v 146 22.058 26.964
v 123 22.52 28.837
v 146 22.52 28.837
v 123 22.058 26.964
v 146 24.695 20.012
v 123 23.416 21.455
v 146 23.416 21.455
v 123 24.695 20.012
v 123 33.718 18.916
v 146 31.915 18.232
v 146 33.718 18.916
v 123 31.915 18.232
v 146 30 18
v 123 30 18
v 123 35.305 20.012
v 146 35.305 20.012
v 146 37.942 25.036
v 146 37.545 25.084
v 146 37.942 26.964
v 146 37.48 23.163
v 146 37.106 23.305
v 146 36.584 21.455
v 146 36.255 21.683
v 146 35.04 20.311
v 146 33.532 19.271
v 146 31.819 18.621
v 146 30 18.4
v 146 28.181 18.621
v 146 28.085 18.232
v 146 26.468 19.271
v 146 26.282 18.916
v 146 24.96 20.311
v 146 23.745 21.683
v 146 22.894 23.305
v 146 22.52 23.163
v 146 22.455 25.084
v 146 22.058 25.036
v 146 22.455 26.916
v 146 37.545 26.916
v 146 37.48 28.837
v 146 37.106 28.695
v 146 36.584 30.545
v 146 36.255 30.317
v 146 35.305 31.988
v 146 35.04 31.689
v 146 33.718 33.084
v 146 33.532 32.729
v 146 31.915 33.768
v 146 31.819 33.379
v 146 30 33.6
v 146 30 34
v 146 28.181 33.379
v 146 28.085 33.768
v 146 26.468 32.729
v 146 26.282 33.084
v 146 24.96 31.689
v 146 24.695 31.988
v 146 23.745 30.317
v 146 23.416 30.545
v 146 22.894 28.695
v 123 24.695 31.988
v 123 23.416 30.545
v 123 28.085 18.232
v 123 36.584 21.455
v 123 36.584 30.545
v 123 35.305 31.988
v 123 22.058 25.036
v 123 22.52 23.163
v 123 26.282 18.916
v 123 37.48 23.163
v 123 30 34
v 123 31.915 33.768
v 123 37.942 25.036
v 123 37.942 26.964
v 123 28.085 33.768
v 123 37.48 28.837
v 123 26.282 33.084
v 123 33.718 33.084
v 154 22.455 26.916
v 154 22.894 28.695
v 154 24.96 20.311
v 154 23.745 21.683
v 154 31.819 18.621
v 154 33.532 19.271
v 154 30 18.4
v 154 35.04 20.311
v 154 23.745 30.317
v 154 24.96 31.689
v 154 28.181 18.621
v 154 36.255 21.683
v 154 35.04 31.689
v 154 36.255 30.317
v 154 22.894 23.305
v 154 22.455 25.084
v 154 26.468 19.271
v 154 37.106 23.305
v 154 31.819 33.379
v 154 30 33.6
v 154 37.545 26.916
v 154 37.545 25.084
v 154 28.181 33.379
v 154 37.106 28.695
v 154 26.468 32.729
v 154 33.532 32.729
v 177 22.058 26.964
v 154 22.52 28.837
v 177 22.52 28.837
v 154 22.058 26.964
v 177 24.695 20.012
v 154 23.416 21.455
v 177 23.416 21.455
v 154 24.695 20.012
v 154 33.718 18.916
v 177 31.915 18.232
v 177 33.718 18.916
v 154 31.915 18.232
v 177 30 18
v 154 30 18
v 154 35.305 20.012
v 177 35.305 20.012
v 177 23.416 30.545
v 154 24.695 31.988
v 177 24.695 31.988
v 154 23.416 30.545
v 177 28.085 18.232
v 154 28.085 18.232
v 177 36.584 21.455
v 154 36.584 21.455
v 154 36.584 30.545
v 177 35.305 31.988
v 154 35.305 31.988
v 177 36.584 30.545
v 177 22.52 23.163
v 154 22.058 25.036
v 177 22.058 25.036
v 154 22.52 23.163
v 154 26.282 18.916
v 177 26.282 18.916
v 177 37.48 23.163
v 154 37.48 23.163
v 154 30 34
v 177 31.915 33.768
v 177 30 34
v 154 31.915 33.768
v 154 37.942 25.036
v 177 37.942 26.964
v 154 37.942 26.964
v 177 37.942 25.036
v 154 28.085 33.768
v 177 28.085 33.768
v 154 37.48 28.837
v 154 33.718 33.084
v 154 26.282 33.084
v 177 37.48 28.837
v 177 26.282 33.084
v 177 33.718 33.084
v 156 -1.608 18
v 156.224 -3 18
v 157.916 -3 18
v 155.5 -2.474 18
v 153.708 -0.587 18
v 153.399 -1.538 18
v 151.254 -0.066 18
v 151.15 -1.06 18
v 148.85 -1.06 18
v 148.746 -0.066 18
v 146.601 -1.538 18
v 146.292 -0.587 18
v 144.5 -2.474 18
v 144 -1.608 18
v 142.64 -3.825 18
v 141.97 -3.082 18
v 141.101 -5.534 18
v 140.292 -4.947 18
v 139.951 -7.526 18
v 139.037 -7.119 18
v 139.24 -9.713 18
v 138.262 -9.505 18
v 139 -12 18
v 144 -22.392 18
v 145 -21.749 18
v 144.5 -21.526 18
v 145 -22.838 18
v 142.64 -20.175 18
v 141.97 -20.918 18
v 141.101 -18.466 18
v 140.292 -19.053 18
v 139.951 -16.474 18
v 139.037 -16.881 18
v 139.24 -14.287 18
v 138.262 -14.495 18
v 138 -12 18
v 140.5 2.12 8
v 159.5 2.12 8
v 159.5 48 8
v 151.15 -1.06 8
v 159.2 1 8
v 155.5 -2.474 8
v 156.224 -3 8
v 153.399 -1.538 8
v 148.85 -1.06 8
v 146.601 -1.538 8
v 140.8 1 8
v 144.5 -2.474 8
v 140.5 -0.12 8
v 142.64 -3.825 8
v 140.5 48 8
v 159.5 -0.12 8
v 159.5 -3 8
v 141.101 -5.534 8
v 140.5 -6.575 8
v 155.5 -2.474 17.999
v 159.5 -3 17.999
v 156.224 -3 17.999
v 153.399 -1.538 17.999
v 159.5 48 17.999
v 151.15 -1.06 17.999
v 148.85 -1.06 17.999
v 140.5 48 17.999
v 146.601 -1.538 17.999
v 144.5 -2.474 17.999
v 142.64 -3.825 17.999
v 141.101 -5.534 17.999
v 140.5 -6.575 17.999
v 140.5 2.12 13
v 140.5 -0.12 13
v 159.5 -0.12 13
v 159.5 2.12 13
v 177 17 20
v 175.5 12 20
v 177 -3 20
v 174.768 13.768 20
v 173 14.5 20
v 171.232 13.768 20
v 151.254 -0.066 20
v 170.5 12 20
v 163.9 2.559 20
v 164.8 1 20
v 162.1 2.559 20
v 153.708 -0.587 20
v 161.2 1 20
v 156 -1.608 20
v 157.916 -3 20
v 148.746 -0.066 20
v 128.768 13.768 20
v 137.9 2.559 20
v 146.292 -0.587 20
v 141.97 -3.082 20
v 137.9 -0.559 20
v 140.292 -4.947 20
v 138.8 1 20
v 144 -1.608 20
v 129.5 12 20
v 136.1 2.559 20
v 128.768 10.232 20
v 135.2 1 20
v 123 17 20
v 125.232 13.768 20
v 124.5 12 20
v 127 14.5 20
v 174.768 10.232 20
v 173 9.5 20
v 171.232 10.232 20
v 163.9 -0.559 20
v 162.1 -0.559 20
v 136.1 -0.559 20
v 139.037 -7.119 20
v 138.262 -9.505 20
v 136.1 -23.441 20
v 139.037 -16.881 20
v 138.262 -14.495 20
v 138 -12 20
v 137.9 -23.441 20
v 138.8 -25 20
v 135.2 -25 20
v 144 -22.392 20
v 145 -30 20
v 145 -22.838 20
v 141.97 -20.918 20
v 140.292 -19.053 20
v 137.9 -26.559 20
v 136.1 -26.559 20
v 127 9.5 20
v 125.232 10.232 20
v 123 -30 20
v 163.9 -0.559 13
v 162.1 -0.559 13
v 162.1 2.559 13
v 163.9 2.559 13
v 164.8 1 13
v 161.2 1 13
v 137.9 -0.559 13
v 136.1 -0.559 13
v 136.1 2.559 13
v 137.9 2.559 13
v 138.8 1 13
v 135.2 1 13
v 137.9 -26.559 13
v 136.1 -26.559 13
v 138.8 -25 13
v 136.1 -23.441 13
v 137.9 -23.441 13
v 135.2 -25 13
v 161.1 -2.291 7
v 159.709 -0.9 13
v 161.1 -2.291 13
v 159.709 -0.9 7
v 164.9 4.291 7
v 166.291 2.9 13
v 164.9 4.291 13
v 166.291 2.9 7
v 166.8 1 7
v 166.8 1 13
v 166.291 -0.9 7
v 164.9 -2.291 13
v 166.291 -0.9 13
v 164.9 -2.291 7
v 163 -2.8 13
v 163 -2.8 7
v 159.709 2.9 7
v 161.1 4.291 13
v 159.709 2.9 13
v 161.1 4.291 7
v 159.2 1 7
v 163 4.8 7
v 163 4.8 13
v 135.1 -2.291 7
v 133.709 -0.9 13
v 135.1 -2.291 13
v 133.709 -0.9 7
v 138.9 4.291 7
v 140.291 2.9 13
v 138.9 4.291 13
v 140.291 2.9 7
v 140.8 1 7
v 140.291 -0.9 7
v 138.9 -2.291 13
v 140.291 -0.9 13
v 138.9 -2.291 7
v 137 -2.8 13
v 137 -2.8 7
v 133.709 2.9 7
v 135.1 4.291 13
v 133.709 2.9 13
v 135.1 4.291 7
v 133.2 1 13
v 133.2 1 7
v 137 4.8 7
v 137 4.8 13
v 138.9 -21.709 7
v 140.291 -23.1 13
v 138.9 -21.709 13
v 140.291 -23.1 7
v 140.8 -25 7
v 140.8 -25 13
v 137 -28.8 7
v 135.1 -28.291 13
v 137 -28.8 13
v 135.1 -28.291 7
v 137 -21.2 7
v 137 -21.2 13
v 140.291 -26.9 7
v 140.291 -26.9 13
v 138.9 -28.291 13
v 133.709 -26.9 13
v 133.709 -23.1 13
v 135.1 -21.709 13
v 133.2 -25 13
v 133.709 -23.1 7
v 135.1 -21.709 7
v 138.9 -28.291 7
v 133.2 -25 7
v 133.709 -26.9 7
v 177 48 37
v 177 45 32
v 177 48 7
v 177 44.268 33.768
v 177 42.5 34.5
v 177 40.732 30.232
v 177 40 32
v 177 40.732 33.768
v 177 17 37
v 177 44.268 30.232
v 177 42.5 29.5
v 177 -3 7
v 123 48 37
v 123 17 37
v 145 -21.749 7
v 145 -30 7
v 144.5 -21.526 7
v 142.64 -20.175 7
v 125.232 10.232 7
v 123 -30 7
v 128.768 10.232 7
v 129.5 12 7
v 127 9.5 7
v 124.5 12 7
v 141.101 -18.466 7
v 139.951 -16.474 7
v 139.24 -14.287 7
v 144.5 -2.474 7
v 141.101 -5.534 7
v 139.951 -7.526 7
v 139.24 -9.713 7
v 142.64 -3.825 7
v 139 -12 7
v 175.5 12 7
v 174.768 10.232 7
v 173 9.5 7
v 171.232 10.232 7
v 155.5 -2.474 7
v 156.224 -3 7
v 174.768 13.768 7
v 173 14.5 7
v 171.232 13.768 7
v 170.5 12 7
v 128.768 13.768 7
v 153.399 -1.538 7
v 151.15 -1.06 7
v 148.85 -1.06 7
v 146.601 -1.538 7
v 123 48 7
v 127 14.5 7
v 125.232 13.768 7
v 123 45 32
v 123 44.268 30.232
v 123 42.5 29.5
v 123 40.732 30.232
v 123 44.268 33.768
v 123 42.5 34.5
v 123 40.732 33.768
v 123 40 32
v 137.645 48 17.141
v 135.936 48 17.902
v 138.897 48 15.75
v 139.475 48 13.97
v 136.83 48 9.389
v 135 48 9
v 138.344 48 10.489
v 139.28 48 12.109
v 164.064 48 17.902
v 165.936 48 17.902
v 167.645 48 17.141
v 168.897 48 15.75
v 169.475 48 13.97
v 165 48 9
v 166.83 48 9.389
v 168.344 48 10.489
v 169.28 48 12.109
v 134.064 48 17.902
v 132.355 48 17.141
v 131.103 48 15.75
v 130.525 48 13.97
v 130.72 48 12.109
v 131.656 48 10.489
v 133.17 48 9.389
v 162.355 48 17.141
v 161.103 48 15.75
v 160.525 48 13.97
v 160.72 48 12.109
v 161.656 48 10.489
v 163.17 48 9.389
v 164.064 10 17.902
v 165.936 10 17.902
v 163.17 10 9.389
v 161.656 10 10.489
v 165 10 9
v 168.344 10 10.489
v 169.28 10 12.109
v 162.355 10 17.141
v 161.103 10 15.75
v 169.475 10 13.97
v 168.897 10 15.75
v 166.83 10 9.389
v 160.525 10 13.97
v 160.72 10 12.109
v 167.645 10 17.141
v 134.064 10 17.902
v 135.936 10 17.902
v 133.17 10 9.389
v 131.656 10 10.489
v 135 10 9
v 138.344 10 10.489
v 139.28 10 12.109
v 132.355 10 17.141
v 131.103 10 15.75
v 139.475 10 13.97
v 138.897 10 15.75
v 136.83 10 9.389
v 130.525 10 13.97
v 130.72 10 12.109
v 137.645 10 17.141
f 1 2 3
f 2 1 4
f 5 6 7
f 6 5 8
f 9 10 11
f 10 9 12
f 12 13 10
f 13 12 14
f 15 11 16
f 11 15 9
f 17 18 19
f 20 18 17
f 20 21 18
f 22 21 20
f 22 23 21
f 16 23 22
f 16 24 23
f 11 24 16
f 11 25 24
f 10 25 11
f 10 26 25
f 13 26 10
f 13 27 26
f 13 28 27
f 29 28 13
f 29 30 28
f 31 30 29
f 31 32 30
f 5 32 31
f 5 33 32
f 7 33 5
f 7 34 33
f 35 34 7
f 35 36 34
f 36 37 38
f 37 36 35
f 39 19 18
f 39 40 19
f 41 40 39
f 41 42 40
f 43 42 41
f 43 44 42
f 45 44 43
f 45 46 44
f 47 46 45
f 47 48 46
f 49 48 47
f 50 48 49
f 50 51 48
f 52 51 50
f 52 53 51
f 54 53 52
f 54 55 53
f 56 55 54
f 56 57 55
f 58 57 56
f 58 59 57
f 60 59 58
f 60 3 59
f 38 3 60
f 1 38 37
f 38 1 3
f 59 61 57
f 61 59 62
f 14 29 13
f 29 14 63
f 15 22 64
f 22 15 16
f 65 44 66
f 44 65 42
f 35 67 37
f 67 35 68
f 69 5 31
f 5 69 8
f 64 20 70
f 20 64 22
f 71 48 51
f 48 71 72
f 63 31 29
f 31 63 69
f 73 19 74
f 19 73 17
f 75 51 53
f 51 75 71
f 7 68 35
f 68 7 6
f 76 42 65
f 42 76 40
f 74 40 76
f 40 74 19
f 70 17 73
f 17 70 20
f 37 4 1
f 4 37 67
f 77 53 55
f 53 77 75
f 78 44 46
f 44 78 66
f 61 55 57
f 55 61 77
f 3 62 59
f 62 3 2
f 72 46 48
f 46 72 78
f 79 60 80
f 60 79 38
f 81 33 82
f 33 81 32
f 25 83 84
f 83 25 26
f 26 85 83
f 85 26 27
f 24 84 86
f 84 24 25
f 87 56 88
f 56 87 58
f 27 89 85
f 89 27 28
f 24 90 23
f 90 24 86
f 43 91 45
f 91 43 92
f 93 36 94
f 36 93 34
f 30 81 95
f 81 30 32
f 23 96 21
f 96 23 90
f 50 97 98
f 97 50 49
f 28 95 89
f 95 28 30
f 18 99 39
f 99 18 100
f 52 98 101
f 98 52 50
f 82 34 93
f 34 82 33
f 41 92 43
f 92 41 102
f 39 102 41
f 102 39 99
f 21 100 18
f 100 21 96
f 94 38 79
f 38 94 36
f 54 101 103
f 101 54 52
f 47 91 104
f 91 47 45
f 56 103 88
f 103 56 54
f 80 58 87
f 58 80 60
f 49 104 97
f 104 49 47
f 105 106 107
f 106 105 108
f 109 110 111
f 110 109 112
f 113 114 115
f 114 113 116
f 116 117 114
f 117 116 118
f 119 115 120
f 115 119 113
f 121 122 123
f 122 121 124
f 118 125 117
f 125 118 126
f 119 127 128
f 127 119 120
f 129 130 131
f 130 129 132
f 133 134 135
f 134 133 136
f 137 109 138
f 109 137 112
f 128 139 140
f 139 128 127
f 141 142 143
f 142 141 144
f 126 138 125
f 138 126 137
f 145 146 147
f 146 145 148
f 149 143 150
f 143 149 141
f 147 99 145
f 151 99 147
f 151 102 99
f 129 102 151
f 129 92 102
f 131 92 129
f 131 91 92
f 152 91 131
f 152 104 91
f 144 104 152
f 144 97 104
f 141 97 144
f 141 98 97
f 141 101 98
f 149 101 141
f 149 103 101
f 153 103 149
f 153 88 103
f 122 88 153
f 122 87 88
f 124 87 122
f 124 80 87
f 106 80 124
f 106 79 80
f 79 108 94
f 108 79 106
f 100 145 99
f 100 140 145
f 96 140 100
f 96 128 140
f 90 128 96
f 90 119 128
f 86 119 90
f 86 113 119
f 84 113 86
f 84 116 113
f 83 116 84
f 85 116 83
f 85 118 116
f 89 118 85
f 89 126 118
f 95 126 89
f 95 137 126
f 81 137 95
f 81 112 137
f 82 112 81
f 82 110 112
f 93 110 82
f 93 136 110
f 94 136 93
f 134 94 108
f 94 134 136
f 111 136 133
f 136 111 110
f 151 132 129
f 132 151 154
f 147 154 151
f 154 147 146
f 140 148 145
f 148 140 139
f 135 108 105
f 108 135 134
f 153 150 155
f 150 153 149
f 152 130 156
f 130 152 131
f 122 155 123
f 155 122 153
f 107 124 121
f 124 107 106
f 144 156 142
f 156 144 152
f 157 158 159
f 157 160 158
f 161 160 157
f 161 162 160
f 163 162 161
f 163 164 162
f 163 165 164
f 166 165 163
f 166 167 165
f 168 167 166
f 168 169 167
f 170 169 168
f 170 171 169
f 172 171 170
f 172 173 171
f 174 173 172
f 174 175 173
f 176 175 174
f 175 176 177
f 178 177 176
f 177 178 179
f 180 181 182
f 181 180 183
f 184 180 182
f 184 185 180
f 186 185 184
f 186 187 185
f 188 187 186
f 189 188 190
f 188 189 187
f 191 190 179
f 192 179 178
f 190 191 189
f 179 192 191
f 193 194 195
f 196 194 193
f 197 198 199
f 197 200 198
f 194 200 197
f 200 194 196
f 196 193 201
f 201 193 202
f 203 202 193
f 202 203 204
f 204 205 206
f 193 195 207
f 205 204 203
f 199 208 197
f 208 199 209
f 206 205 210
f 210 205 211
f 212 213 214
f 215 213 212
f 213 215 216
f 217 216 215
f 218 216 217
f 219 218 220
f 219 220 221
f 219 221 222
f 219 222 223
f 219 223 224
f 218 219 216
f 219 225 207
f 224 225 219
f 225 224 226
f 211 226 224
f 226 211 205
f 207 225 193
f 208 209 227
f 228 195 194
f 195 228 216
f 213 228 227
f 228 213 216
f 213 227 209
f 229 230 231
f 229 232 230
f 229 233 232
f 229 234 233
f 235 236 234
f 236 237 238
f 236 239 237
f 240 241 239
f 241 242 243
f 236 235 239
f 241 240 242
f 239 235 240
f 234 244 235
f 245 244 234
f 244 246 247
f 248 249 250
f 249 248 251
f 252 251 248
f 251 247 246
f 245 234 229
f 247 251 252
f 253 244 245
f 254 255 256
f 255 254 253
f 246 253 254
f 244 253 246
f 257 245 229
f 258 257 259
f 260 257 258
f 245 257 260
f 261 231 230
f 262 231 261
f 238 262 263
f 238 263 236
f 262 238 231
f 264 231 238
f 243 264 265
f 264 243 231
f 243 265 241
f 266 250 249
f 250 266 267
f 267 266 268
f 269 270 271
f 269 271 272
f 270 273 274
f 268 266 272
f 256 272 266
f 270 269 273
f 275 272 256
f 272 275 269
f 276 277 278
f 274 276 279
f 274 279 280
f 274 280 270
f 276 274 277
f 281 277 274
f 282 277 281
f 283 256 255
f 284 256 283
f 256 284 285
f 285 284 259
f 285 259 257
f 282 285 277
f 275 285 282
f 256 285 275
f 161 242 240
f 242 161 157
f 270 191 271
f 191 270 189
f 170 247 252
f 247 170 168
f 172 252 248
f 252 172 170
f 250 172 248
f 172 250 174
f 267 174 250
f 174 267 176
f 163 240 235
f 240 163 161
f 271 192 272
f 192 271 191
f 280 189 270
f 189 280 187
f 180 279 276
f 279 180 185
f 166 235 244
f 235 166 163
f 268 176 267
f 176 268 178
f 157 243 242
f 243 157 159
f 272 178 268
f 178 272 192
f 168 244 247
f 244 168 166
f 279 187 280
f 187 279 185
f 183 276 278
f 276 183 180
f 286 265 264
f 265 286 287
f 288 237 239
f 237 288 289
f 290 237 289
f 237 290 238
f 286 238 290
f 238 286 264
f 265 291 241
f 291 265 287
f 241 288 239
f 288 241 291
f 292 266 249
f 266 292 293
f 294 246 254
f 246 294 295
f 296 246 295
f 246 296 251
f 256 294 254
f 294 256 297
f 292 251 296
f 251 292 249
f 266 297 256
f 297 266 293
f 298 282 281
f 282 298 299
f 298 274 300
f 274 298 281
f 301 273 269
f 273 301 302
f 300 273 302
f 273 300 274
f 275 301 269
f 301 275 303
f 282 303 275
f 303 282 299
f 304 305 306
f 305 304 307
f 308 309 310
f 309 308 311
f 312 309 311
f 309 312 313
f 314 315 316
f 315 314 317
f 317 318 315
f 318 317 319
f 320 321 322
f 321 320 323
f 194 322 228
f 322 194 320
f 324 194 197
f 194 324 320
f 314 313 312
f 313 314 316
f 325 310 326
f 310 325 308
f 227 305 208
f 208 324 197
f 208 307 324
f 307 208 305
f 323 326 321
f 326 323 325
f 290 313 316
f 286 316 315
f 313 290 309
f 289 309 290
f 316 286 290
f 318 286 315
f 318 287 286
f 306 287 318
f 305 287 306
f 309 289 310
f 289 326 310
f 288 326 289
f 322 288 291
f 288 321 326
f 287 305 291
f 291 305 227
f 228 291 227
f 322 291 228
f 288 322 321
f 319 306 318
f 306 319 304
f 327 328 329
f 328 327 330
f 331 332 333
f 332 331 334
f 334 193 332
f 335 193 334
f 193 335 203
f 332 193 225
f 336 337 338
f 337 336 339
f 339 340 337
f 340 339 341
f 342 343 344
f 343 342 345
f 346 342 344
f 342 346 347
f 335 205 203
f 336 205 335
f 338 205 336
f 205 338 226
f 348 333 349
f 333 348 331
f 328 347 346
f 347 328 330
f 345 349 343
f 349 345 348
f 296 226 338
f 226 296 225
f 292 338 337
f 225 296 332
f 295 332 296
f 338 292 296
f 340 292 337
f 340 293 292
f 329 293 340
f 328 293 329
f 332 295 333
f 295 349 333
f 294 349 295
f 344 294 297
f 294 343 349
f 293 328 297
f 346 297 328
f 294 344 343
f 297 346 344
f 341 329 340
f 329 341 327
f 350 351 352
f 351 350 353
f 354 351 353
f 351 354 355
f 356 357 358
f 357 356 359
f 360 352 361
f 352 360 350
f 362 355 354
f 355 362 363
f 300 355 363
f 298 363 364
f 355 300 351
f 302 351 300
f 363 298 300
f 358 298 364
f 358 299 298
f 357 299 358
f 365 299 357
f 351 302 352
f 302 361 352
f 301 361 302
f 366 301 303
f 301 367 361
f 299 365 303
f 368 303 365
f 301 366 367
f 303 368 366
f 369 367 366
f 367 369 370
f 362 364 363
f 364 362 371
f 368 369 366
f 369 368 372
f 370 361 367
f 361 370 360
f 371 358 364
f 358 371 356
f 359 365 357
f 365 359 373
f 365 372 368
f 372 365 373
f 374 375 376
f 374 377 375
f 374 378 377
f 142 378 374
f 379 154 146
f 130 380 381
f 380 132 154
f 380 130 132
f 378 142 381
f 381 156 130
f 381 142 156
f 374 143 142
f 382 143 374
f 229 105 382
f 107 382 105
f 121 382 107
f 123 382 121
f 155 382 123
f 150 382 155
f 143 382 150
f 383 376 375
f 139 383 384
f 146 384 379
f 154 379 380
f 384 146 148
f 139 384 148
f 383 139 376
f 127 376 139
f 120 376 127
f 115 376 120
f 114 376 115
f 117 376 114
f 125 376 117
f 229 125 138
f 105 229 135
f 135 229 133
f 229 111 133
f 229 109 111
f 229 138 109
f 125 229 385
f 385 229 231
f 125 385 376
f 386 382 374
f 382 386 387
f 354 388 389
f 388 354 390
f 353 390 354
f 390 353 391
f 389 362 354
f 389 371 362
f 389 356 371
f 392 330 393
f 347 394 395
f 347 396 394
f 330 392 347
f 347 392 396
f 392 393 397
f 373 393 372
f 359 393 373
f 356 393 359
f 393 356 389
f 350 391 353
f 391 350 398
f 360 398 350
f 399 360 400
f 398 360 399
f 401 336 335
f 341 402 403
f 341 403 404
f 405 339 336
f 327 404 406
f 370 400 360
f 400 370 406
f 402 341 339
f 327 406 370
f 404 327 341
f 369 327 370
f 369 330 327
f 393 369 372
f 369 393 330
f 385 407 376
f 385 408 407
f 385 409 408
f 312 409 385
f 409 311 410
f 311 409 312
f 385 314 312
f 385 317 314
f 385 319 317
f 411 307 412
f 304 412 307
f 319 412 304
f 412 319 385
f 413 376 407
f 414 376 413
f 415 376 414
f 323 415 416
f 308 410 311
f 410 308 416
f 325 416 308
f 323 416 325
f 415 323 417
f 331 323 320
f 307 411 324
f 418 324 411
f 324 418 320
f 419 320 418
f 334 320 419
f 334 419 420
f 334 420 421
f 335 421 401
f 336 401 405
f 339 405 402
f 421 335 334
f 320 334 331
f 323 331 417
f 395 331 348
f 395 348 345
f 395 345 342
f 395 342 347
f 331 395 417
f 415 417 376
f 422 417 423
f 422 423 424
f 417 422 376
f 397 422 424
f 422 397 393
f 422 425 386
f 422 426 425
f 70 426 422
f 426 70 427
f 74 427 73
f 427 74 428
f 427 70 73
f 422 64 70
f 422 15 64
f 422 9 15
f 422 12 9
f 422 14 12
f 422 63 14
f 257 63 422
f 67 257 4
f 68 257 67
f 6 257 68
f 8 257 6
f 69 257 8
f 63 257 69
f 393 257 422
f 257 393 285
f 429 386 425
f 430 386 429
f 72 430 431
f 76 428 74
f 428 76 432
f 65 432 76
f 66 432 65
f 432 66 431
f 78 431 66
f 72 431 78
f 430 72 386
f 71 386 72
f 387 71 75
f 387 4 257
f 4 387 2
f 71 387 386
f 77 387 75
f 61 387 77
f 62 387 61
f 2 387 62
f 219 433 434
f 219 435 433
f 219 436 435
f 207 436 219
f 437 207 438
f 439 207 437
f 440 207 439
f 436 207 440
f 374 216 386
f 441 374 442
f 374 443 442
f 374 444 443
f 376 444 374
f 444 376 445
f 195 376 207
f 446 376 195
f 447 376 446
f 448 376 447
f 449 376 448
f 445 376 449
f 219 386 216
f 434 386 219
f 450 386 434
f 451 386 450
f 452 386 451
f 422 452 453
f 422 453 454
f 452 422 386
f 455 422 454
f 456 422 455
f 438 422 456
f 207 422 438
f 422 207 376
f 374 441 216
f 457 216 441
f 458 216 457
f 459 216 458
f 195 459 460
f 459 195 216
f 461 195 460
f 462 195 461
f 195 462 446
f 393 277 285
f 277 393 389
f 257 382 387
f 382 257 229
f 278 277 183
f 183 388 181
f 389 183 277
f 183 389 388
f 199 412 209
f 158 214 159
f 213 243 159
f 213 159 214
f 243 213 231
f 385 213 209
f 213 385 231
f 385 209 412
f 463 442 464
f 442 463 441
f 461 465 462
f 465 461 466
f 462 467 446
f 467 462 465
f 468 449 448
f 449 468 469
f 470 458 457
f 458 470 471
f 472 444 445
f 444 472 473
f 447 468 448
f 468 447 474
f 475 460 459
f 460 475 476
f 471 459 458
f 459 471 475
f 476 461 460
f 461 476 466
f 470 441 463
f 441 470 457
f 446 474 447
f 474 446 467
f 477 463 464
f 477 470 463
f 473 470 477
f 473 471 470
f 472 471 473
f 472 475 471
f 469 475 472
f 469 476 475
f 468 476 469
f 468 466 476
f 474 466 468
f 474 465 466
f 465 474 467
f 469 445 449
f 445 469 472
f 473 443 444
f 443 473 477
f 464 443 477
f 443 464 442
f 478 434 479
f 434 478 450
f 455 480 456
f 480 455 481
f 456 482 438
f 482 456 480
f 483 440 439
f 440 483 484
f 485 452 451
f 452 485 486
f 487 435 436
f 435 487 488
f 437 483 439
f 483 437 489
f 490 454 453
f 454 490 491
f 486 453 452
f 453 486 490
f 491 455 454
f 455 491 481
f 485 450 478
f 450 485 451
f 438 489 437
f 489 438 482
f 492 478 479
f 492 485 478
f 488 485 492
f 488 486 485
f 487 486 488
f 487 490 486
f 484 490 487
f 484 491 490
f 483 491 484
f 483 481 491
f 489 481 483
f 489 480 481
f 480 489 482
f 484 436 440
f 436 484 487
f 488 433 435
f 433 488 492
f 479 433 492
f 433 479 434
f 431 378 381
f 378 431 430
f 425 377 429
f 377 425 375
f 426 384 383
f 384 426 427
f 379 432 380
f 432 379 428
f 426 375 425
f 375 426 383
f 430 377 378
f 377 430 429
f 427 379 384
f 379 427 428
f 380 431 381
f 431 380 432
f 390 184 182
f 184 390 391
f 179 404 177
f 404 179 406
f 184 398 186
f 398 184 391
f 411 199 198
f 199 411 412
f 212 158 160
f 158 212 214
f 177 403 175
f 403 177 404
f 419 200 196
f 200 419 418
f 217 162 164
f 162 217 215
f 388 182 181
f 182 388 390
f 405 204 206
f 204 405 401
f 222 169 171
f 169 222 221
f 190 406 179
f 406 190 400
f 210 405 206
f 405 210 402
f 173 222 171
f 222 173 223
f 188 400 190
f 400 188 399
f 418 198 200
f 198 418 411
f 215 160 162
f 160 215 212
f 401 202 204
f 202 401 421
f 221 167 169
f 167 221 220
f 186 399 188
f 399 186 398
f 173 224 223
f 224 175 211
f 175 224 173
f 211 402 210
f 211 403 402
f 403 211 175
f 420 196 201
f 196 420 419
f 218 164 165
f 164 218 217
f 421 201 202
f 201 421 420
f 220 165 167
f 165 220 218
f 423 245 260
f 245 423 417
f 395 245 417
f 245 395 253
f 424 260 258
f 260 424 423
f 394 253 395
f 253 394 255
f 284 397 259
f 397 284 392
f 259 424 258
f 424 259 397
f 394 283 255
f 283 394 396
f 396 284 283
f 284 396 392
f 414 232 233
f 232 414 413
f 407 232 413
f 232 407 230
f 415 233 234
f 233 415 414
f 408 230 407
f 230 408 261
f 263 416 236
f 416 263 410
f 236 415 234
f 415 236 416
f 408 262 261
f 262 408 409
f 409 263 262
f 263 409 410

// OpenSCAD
// file: yaxis.scad
module lm08uu(){
cylinder(r=16/2,h=24,center=true);
cylinder(r=10/2,h=124,center=true);

}
module belt(l=100,bearing=13,thickness=2.5,width=6, fill=false){
	difference(){
		union(){
			translate([-l/2,0,0])cylinder(r=(bearing+thickness)/2,h=width);
			translate([l/2,0,0])cylinder(r=(bearing+thickness)/2,h=width);
			translate([-l/2,-(bearing+thickness)/2,0])cube([l,(bearing+thickness),width-0.001]);
		}
		if(fill==true){
			translate([-l/2,0,-0.5])cylinder(r=bearing/2,h=width+2);
			translate([l/2,0,-0.5])cylinder(r=bearing/2,h=width+2);
			translate([-l/2,-bearing/2,-0.5])cube([l,bearing,width+1.999]);
		}
	}
}

*lm08uu();
*belt(100);

rotate([90,0,0])difference(){
translate([124,50,-2])cube([52,86,30]);
translate([152,80,28-8])cylinder(r=1.8,h=30);
translate([152,80+35,28-8])cylinder(r=1.8,h=30);
#translate([143,90,0])cylinder(r=1.8,h=30);
#translate([143,90+35,0])cylinder(r=1.8,h=30);
translate([115,53,20])rotate([0,90,0]){
cylinder(r=1.8,h=70);
translate([0,30,0])cylinder(r=1.8,h=70);
translate([0,50,0])cylinder(r=1.8,h=70);
translate([0,80,0])cylinder(r=1.8,h=70);
}

translate([95,71+1.75,-33.5])cube([50,80,50]);
#translate([140,49.9,21.1])cube([20,16,7]);
#translate([145,49.9+16.3,22.1])cube([3,150,7]);
#translate([165,61.75,8.5])rotate([0,90,90])scale(0.98)lm08uu();
translate([165,80,8.5])rotate([0,90,90])scale(0.98)lm08uu();
translate([165,100,8.5])rotate([0,90,90])scale(0.98)lm08uu();
translate([165,120,8.5])rotate([0,90,90])scale(0.98)lm08uu();
translate([165,140,8.5])rotate([0,90,90])scale(0.98)lm08uu();
translate([135,61.75,8.5])rotate([0,90,90])scale(0.98)lm08uu();
#translate([135,-30,8.5])rotate([0,90,90])color([0.2,0.2,0.5])cylinder(r=5.25,h=300);
translate([150,63+12,-3.5])rotate([0,0,90])belt(150,bearing=4.5,width=20,thickness=7.5,fil=true);
}
// file: truss.scad
module screw(h=20, r=2, r_head=3.5, head_drop=0, slant=true, poly=false, $fn=0){
    //makes screw with head
    //for substraction as screw hole
    if (poly) {
        cylinder_poly(h=h, r=r, $fn=$fn);
    } else {
        cylinder(h=h, r=r, $fn=$fn);
    }
    if (slant) {
        translate([0, 0, head_drop-0.01]) cylinder(h=r_head, r2=0, r1=r_head, $fn=$fn);
    }

    if (head_drop > 0) {
        translate([0, 0, -0.01]) cylinder(h=head_drop+0.01, r=r_head, $fn=$fn);
    }
}


module nema17(places=[1,1,1,1], size=15.5, h=10, holes=true, shadow=5, $fn=24){
    for (i=[0:3]) {
        if (places[i] == 1) {
            rotate([0, 0, 90*i]) translate([size, size, 0]) {
                if (holes) {
                    #rotate([0, 0, -90*i])  translate([0,0,-10]) screw(r=1.7, slant=false, head_drop=13, $fn=$fn, h=h+12);
                } else {
                    rotate([0, 0, -90*i]) cylinder(h=h, r=5.5, $fn=$fn);
                }
            }
        }
    }
    if (shadow != false) {
       * %translate ([0, 0, shadow+21+3]) cube([42,42,42], center = true);
    //flange
        translate ([0, 0, shadow+21+3-21-1]) cylinder(r=12,h=2.1, center = true, $fn=20);
    //shaft
        %translate ([0, 0, shadow+21+3-21-7]) cylinder(r=2.5,h=14, center = true);
    }
}


module truss(){
	difference(){
		cube([60,60,4]);
		for(i=[0:2]){
			translate([10+20*i,10,0])cylinder(r=3,h=20,center=true);
			translate([10,10+20*i,0])cylinder(r=3,h=20,center=true);
		}
		translate([70,0,-0.01])rotate([0,0,45])cube([50.5,90.5,6.5]);
	}
}
module trussfoot(){
truss();
translate([-20,0.01,0.01])cube([20,20,4]);
translate([-30,0.02,0.02])cube([10,19.98,8]);
}

module trussrod(){
difference(){
		union(){
		truss();
		translate([20,20-2.5])cube([20,25,37]);
		}
		translate([30,30,21+5])rotate([0,90,0])cylinder(r=4.5,h=30,center=true);
#		translate([30,30,28+4])rotate([0,90,90])cylinder(r=2.4,h=30,center=true);
		translate([30,30,26+6.01])cube([30,2,20],center=true);

		for(i=[0:2]){
			translate([10+20*i,10,13+13.99])cylinder(r=7,h=50,center=true);
			translate([10,10+20*i,13+13.99])cylinder(r=7,h=50,center=true);
		}
		
	}
}
module trussmotor(){
difference(){
		union(){
		truss();
		translate([20,20-2.5])cube([20,35,37]);
		translate([-20,20-2.51])cube([41,10.5,37]);
		
		}
		#translate([26,40,10+5])cube([16,7,30]);
		translate([-0.8,20,27.3+4])rotate([90,0,180])nema17();
		translate([-10,30,37+4])cube([40,30,40],center=true);
		translate([30,30,21+5])rotate([0,90,0])cylinder(r=4.2,h=30,center=true);
#		translate([30,30,28+5])rotate([0,90,90])cylinder(r=2.4,h=30,center=true);
		translate([30,30,26+6])cube([30,2,20],center=true);

		for(i=[0:2]){
			translate([10+20*i,10,13+13.99])cylinder(r=7,h=50,center=true);
			translate([10,10+20*i,13+13.99])cylinder(r=7,h=50,center=true);
			translate([10+20*i,10,0])cylinder(r=3,h=20,center=true);
			translate([10,10+20*i,0])cylinder(r=3,h=20,center=true);
		}
		
	}
}

*trussfoot();
*translate([72,72,0]) mirror([1,1]) trussfoot();
*truss();
*translate([72,72,0]) mirror([1,1]) truss();
translate([-25,0])mirror([1,0,0]){
trussrod();
translate([0,-3,0]) mirror([0,1,0]) trussrod();
}
trussmotor();
translate([0,-3,0]) mirror([0,1,0]) trussmotor();

%cube([200,200,0.01],true);
// main file
use <truss.scad>;
use <yaxis.scad>;
module nema14(){
cube([36,36,40],true);
translate([0,0,1])cylinder(r=12,h=42,center=true);
translate([0,0,1])cylinder(r=3,h=38);
translate([13,13,1])cylinder(r=1.8,h=38);
translate([13,-13,1])cylinder(r=1.8,h=38);
translate([-13,13,1])cylinder(r=1.8,h=38);
translate([-13,-13,1])cylinder(r=1.8,h=38);
translate([13,13,27])cylinder(r=3.8,h=28);
translate([13,-13,27])cylinder(r=3.8,h=28);
translate([-13,13,27])cylinder(r=3.8,h=28);
translate([-13,-13,27])cylinder(r=3.8,h=28);

}
module yidler(){
difference(){
	union(){
		translate([123,-12,2])cube([300-2*123,52,30]);
	}
	translate([121,-53,17])cube([300-2*121,70,30]);
	translate([155,-73+11,0])rotate([0,0,0])cube([300-2*121,70,30]);
translate([165,-30,8.5])rotate([0,90,90])color([0.2,0.2,0.5])cylinder(r=4.5,h=300);
translate([135,-30,8.5])rotate([0,90,90])color([0.2,0.2,0.5])cylinder(r=4.5,h=300);
translate([150,63+12,3])rotate([0,0,90])belt(150,bearing=8,width=10,thickness=11);
translate([134,30,21])rotate([0,90,0])lm08uu();
translate([150,30,21])rotate([0,90,0])scale(0.95)lm08uu();
translate([166,30,21])rotate([0,90,0])lm08uu();
#translate([150,0,3])cylinder(r=8,h=11.5);
#translate([150,0,-3])cylinder(r=2.5,h=25);
translate([127,12,0])rotate([0,0,0])cylinder(r=2.5,h=30);
translate([300-127,12,0])rotate([0,0,0])cylinder(r=2.5,h=30);
}
}

module ymotor(){
difference(){
	union(){
		translate([123,-30,2])cube([300-2*123,78,30]);
	}
	translate([121,-53,15])cube([300-2*121,70,30]);
	translate([145,-73,0])rotate([0,0,0])cube([300-2*121,70,30]);
translate([165,10,8.5])rotate([0,90,90])color([0.2,0.2,0.5])cylinder(r=4.5,h=300);
translate([135,10,8.5])rotate([0,90,90])color([0.2,0.2,0.5])cylinder(r=4.5,h=300);
translate([134,30,21])rotate([0,90,0])lm08uu();
translate([150,30,21])rotate([0,90,0])scale(0.95)lm08uu();
translate([166,30,21])rotate([0,90,0])lm08uu();
translate([100,42.5,27])rotate([0,90,0])cylinder(r=2.5,h=150);

translate([150,63,3])rotate([0,0,90])belt(150,bearing=8,width=10,thickness=11);
translate([150,-12,35])mirror([0,0,1])nema14();
translate([150,-12,-11])cylinder(r=11,h=30);
translate([127,12,0])rotate([0,0,0])cylinder(r=2.5,h=30);
translate([300-127,12,0])rotate([0,0,0])cylinder(r=2.5,h=30);
}
}

%trussrod();
%translate([300,0,0])rotate([0,0,-90])mirror([1,1])trussmotor();
%translate([167,15,29+4])rotate([90,0,0])belt(275);

%translate([0,0,-20])color([0.5,0.2,0.2])cube([300,20,20]);
%translate([-18,30,26])rotate([0,90,0])color([0.2,0.2,0.5])cylinder(r=4,h=300);

translate([0,0,5])ymotor();

*translate([0,0,-193])rotate([0,-90,0])yidler();
*translate([40,0,-193])rotate([0,-90,0])ymotor();
